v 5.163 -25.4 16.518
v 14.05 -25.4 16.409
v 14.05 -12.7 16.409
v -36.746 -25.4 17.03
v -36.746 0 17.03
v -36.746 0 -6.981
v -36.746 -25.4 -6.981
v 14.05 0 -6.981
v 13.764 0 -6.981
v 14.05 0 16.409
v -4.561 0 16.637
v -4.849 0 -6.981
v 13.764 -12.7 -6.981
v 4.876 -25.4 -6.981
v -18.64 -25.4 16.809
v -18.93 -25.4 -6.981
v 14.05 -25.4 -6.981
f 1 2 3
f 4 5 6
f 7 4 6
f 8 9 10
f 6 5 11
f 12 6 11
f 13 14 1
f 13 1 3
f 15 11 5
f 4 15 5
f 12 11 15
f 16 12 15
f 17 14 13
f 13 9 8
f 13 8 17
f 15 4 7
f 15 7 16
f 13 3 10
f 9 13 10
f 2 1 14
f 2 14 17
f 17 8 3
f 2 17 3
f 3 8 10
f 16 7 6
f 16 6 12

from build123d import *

# Parameters (mm, degrees)
F1_DEPTH = 25.4
F3_DEPTH = 25.4


with BuildPart() as f1:
    # F0 (on Front) → F1 (new body)
    with BuildSketch(Plane.XZ):
        Polygon((14.0499369874, 16.4094424249), (-36.7462737187, 17.0299082983), (-36.7462737187, -6.9805325929), (14.0499369874, -6.9805325929), align=None)
    extrude(amount=F1_DEPTH)

    # F2 (on face) → F3 (cut)
    with BuildSketch(Plane(origin=(0.202504218, 0, 16.5785861336), x_dir=(0.9999254076, 0, -0.0122138951), z_dir=(0.0122138951, 0, 0.9999254076))):
        Polygon((-4.7634486109, 0), (-18.8437420875, -25.4), (4.9604303204, -25.4), (13.8484657597, -12.7), (13.8484657597, 0), align=None)
    extrude(amount=-F3_DEPTH, mode=Mode.SUBTRACT)


solid = f1.part
